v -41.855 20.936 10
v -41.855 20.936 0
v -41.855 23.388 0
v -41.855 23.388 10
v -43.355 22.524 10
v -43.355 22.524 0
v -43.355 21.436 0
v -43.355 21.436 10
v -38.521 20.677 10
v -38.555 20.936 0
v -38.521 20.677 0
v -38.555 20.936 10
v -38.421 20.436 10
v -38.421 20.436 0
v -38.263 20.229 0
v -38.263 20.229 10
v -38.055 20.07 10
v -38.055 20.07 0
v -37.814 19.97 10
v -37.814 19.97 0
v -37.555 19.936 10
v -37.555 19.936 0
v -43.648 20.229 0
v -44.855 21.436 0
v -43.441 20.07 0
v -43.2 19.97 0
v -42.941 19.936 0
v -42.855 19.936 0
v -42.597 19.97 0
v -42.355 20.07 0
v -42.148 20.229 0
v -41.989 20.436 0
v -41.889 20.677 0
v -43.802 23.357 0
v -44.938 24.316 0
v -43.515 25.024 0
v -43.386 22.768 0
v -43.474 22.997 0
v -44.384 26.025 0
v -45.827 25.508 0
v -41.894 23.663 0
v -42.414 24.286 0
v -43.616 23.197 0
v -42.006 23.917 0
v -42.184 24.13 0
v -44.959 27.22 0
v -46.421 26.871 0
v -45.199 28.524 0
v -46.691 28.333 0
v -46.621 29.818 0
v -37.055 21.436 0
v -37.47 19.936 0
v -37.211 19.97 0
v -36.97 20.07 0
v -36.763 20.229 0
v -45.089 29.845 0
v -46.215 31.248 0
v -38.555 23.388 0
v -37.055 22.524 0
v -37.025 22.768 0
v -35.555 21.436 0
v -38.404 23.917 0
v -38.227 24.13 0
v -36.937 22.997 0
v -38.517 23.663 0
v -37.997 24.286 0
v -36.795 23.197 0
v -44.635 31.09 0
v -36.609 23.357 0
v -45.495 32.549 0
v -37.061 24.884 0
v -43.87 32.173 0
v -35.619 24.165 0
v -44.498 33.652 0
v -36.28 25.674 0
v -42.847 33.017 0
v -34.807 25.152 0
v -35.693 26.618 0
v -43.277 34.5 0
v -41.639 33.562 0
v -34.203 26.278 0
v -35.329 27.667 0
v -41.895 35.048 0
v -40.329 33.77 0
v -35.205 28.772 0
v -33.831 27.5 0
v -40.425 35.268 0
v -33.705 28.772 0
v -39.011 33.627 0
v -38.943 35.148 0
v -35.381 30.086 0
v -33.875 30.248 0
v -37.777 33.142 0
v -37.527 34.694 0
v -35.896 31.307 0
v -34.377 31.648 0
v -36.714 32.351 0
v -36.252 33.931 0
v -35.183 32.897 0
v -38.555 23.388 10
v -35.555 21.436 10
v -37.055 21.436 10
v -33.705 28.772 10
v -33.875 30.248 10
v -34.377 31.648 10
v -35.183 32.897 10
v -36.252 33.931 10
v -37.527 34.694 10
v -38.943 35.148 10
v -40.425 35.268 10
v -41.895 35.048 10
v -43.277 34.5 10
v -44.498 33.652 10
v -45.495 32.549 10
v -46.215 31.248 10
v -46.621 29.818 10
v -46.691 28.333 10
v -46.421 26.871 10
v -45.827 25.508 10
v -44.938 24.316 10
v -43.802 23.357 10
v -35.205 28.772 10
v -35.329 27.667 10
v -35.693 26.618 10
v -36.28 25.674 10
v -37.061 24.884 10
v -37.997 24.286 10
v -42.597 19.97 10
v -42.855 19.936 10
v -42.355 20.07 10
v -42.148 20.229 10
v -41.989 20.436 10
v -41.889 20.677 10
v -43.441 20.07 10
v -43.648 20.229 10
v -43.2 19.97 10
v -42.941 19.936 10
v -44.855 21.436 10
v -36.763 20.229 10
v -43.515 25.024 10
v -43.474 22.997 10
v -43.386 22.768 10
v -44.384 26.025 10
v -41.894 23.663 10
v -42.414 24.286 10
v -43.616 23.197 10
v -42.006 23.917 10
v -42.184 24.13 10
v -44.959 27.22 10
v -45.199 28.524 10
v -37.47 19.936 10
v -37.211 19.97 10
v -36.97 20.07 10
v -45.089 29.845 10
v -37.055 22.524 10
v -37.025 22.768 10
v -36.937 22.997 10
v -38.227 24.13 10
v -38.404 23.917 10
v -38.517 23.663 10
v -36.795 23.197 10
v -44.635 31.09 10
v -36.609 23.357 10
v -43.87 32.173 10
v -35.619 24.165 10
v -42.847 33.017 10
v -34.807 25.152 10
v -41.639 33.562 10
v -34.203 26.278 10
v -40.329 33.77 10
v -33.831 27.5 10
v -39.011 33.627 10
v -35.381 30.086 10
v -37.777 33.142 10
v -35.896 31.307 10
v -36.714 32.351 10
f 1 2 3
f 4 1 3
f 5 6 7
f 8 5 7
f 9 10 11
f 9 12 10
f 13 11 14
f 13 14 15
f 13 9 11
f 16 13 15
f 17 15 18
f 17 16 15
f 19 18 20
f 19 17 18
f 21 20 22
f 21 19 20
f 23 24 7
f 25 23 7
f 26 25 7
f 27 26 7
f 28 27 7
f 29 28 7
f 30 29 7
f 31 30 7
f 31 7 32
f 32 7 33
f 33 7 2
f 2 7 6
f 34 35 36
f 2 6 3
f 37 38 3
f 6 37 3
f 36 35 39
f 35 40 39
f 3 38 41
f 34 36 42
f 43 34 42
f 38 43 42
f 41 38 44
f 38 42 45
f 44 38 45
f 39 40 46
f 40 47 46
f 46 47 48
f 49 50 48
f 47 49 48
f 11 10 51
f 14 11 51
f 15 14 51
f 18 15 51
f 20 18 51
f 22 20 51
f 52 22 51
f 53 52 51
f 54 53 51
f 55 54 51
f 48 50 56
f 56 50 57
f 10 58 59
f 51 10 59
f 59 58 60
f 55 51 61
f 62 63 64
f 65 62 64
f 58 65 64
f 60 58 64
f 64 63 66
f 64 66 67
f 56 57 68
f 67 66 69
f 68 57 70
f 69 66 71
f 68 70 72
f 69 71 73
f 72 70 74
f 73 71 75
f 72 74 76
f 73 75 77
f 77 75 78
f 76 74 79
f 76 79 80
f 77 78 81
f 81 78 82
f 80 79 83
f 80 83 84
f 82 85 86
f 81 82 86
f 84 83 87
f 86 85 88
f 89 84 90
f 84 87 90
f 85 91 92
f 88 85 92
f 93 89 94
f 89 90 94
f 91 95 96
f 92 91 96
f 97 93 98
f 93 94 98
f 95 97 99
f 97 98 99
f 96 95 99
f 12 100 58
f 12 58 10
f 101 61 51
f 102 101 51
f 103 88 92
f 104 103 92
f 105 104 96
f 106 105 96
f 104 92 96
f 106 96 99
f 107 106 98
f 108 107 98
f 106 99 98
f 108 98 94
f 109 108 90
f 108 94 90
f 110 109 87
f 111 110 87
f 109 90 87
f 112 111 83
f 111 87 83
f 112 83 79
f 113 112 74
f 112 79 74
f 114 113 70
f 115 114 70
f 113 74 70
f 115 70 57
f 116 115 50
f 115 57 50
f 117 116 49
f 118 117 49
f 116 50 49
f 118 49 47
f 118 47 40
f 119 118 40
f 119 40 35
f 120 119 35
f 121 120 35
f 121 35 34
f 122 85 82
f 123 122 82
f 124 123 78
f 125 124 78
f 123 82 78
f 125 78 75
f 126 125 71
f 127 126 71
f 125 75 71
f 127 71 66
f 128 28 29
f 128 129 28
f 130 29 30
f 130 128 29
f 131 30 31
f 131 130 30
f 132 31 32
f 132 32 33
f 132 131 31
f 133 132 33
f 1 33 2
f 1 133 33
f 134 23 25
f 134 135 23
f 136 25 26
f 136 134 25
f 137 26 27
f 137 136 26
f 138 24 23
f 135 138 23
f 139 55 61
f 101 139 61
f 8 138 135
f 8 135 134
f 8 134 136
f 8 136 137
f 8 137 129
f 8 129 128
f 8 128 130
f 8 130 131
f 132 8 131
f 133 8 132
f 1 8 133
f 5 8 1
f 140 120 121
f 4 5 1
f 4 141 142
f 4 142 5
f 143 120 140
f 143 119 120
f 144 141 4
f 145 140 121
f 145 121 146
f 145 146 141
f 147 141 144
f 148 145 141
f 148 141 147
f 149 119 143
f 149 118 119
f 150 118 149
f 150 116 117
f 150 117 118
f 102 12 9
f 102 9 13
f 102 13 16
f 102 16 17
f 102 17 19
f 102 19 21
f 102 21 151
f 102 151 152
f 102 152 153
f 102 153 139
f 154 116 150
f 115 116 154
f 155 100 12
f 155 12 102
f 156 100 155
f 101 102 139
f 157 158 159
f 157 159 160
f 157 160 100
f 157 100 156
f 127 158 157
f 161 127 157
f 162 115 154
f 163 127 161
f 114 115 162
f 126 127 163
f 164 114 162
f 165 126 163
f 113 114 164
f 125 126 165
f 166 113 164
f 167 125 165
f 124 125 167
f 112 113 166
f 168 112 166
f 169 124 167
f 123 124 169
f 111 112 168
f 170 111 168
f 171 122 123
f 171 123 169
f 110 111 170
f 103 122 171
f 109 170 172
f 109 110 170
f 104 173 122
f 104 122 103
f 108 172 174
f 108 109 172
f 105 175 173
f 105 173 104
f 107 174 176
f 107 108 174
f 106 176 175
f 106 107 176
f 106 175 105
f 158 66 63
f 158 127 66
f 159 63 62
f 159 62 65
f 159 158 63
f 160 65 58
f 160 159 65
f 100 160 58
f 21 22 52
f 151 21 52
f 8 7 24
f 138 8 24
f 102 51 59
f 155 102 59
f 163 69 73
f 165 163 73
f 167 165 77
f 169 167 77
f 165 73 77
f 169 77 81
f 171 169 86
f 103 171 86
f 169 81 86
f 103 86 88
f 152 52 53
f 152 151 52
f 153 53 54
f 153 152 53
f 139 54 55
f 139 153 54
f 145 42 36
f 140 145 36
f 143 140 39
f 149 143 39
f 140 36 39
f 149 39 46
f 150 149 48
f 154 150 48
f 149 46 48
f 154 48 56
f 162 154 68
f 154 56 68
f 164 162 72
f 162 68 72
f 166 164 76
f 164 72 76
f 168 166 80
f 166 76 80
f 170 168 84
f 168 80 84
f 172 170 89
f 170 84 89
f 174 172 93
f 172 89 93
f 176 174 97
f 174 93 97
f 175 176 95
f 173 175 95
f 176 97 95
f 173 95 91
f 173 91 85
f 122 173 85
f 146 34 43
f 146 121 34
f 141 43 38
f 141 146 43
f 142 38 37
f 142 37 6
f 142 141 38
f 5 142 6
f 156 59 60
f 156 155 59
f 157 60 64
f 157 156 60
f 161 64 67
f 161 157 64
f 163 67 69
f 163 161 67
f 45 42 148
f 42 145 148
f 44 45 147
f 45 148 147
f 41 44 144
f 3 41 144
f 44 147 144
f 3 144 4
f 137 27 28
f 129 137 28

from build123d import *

# Parameters (mm, degrees)
F1_DEPTH = 10
F2_R     = 1


with BuildPart() as f1:
    # F0 (on Top) → F1 (new body)
    with BuildSketch(Plane.XY):
        with BuildLine():
            ThreePointArc((-41.8554165609, 24.0516047226), (-43.0993757866, 32.8488859903), (-35.2054165609, 28.7715093827))
            ThreePointArc((-35.2054165609, 28.7715093827), (-36.1280399533, 25.877550157), (-38.5554165609, 24.0516047226))
            Line((-38.5554165609, 24.0516047226), (-38.5554165609, 22.4844194358))
            ThreePointArc((-38.5554165609, 22.4844194358), (-37.7866546618, 22.738302037), (-37.0554165609, 23.0857816368))
            ThreePointArc((-37.0554165609, 23.0857816368), (-34.605193351, 25.4718881923), (-33.7054165609, 28.7715093827))
            ThreePointArc((-33.7054165609, 28.7715093827), (-43.5050377512, 34.3717325925), (-43.3554165609, 23.0857816368))
            ThreePointArc((-43.3554165609, 23.0857816368), (-42.6241784599, 22.738302037), (-41.8554165609, 22.4844194358))
            Line((-41.8554165609, 22.4844194358), (-41.8554165609, 24.0516047226))
        make_face()
        with BuildLine():
            ThreePointArc((-37.0554165609, 23.0857816368), (-37.7866546618, 22.738302037), (-38.5554165609, 22.4844194358))
            Line((-38.5554165609, 22.4844194358), (-38.5554165609, 19.9357816368))
            Line((-38.5554165609, 19.9357816368), (-37.0554165609, 19.9357816368))
            Line((-37.0554165609, 19.9357816368), (-37.0554165609, 21.4357816368))
            Line((-37.0554165609, 21.4357816368), (-37.0554165609, 23.0857816368))
        make_face()
        with BuildLine():
            Line((-41.8554165609, 19.9357816368), (-41.8554165609, 22.4844194358))
            ThreePointArc((-41.8554165609, 22.4844194358), (-42.6241784599, 22.738302037), (-43.3554165609, 23.0857816368))
            Line((-43.3554165609, 23.0857816368), (-43.3554165609, 21.4357816368))
            Line((-43.3554165609, 21.4357816368), (-43.3554165609, 19.9357816368))
            Line((-43.3554165609, 19.9357816368), (-41.8554165609, 19.9357816368))
        make_face()
        Polygon((-43.3554165609, 19.9357816368), (-43.3554165609, 21.4357816368), (-44.8554165609, 21.4357816368), align=None)
        Polygon((-35.5554165609, 21.4357816368), (-37.0554165609, 21.4357816368), (-37.0554165609, 19.9357816368), align=None)
    extrude(amount=F1_DEPTH)

    # F2
    f2_edges = [f1.edges().sort_by_distance(p)[0] for p in [
        (-43.355417, 19.935782, 5),
        (-37.055417, 19.935782, 5),
        (-41.855417, 19.935782, 5),
        (-41.855417, 24.051605, 5),
        (-37.055417, 23.085782, 5),
        (-43.355417, 23.085782, 5),
        (-38.555417, 24.051605, 5),
        (-38.555417, 19.935782, 5),
    ]]
    fillet(f2_edges, radius=F2_R)


solid = f1.part
